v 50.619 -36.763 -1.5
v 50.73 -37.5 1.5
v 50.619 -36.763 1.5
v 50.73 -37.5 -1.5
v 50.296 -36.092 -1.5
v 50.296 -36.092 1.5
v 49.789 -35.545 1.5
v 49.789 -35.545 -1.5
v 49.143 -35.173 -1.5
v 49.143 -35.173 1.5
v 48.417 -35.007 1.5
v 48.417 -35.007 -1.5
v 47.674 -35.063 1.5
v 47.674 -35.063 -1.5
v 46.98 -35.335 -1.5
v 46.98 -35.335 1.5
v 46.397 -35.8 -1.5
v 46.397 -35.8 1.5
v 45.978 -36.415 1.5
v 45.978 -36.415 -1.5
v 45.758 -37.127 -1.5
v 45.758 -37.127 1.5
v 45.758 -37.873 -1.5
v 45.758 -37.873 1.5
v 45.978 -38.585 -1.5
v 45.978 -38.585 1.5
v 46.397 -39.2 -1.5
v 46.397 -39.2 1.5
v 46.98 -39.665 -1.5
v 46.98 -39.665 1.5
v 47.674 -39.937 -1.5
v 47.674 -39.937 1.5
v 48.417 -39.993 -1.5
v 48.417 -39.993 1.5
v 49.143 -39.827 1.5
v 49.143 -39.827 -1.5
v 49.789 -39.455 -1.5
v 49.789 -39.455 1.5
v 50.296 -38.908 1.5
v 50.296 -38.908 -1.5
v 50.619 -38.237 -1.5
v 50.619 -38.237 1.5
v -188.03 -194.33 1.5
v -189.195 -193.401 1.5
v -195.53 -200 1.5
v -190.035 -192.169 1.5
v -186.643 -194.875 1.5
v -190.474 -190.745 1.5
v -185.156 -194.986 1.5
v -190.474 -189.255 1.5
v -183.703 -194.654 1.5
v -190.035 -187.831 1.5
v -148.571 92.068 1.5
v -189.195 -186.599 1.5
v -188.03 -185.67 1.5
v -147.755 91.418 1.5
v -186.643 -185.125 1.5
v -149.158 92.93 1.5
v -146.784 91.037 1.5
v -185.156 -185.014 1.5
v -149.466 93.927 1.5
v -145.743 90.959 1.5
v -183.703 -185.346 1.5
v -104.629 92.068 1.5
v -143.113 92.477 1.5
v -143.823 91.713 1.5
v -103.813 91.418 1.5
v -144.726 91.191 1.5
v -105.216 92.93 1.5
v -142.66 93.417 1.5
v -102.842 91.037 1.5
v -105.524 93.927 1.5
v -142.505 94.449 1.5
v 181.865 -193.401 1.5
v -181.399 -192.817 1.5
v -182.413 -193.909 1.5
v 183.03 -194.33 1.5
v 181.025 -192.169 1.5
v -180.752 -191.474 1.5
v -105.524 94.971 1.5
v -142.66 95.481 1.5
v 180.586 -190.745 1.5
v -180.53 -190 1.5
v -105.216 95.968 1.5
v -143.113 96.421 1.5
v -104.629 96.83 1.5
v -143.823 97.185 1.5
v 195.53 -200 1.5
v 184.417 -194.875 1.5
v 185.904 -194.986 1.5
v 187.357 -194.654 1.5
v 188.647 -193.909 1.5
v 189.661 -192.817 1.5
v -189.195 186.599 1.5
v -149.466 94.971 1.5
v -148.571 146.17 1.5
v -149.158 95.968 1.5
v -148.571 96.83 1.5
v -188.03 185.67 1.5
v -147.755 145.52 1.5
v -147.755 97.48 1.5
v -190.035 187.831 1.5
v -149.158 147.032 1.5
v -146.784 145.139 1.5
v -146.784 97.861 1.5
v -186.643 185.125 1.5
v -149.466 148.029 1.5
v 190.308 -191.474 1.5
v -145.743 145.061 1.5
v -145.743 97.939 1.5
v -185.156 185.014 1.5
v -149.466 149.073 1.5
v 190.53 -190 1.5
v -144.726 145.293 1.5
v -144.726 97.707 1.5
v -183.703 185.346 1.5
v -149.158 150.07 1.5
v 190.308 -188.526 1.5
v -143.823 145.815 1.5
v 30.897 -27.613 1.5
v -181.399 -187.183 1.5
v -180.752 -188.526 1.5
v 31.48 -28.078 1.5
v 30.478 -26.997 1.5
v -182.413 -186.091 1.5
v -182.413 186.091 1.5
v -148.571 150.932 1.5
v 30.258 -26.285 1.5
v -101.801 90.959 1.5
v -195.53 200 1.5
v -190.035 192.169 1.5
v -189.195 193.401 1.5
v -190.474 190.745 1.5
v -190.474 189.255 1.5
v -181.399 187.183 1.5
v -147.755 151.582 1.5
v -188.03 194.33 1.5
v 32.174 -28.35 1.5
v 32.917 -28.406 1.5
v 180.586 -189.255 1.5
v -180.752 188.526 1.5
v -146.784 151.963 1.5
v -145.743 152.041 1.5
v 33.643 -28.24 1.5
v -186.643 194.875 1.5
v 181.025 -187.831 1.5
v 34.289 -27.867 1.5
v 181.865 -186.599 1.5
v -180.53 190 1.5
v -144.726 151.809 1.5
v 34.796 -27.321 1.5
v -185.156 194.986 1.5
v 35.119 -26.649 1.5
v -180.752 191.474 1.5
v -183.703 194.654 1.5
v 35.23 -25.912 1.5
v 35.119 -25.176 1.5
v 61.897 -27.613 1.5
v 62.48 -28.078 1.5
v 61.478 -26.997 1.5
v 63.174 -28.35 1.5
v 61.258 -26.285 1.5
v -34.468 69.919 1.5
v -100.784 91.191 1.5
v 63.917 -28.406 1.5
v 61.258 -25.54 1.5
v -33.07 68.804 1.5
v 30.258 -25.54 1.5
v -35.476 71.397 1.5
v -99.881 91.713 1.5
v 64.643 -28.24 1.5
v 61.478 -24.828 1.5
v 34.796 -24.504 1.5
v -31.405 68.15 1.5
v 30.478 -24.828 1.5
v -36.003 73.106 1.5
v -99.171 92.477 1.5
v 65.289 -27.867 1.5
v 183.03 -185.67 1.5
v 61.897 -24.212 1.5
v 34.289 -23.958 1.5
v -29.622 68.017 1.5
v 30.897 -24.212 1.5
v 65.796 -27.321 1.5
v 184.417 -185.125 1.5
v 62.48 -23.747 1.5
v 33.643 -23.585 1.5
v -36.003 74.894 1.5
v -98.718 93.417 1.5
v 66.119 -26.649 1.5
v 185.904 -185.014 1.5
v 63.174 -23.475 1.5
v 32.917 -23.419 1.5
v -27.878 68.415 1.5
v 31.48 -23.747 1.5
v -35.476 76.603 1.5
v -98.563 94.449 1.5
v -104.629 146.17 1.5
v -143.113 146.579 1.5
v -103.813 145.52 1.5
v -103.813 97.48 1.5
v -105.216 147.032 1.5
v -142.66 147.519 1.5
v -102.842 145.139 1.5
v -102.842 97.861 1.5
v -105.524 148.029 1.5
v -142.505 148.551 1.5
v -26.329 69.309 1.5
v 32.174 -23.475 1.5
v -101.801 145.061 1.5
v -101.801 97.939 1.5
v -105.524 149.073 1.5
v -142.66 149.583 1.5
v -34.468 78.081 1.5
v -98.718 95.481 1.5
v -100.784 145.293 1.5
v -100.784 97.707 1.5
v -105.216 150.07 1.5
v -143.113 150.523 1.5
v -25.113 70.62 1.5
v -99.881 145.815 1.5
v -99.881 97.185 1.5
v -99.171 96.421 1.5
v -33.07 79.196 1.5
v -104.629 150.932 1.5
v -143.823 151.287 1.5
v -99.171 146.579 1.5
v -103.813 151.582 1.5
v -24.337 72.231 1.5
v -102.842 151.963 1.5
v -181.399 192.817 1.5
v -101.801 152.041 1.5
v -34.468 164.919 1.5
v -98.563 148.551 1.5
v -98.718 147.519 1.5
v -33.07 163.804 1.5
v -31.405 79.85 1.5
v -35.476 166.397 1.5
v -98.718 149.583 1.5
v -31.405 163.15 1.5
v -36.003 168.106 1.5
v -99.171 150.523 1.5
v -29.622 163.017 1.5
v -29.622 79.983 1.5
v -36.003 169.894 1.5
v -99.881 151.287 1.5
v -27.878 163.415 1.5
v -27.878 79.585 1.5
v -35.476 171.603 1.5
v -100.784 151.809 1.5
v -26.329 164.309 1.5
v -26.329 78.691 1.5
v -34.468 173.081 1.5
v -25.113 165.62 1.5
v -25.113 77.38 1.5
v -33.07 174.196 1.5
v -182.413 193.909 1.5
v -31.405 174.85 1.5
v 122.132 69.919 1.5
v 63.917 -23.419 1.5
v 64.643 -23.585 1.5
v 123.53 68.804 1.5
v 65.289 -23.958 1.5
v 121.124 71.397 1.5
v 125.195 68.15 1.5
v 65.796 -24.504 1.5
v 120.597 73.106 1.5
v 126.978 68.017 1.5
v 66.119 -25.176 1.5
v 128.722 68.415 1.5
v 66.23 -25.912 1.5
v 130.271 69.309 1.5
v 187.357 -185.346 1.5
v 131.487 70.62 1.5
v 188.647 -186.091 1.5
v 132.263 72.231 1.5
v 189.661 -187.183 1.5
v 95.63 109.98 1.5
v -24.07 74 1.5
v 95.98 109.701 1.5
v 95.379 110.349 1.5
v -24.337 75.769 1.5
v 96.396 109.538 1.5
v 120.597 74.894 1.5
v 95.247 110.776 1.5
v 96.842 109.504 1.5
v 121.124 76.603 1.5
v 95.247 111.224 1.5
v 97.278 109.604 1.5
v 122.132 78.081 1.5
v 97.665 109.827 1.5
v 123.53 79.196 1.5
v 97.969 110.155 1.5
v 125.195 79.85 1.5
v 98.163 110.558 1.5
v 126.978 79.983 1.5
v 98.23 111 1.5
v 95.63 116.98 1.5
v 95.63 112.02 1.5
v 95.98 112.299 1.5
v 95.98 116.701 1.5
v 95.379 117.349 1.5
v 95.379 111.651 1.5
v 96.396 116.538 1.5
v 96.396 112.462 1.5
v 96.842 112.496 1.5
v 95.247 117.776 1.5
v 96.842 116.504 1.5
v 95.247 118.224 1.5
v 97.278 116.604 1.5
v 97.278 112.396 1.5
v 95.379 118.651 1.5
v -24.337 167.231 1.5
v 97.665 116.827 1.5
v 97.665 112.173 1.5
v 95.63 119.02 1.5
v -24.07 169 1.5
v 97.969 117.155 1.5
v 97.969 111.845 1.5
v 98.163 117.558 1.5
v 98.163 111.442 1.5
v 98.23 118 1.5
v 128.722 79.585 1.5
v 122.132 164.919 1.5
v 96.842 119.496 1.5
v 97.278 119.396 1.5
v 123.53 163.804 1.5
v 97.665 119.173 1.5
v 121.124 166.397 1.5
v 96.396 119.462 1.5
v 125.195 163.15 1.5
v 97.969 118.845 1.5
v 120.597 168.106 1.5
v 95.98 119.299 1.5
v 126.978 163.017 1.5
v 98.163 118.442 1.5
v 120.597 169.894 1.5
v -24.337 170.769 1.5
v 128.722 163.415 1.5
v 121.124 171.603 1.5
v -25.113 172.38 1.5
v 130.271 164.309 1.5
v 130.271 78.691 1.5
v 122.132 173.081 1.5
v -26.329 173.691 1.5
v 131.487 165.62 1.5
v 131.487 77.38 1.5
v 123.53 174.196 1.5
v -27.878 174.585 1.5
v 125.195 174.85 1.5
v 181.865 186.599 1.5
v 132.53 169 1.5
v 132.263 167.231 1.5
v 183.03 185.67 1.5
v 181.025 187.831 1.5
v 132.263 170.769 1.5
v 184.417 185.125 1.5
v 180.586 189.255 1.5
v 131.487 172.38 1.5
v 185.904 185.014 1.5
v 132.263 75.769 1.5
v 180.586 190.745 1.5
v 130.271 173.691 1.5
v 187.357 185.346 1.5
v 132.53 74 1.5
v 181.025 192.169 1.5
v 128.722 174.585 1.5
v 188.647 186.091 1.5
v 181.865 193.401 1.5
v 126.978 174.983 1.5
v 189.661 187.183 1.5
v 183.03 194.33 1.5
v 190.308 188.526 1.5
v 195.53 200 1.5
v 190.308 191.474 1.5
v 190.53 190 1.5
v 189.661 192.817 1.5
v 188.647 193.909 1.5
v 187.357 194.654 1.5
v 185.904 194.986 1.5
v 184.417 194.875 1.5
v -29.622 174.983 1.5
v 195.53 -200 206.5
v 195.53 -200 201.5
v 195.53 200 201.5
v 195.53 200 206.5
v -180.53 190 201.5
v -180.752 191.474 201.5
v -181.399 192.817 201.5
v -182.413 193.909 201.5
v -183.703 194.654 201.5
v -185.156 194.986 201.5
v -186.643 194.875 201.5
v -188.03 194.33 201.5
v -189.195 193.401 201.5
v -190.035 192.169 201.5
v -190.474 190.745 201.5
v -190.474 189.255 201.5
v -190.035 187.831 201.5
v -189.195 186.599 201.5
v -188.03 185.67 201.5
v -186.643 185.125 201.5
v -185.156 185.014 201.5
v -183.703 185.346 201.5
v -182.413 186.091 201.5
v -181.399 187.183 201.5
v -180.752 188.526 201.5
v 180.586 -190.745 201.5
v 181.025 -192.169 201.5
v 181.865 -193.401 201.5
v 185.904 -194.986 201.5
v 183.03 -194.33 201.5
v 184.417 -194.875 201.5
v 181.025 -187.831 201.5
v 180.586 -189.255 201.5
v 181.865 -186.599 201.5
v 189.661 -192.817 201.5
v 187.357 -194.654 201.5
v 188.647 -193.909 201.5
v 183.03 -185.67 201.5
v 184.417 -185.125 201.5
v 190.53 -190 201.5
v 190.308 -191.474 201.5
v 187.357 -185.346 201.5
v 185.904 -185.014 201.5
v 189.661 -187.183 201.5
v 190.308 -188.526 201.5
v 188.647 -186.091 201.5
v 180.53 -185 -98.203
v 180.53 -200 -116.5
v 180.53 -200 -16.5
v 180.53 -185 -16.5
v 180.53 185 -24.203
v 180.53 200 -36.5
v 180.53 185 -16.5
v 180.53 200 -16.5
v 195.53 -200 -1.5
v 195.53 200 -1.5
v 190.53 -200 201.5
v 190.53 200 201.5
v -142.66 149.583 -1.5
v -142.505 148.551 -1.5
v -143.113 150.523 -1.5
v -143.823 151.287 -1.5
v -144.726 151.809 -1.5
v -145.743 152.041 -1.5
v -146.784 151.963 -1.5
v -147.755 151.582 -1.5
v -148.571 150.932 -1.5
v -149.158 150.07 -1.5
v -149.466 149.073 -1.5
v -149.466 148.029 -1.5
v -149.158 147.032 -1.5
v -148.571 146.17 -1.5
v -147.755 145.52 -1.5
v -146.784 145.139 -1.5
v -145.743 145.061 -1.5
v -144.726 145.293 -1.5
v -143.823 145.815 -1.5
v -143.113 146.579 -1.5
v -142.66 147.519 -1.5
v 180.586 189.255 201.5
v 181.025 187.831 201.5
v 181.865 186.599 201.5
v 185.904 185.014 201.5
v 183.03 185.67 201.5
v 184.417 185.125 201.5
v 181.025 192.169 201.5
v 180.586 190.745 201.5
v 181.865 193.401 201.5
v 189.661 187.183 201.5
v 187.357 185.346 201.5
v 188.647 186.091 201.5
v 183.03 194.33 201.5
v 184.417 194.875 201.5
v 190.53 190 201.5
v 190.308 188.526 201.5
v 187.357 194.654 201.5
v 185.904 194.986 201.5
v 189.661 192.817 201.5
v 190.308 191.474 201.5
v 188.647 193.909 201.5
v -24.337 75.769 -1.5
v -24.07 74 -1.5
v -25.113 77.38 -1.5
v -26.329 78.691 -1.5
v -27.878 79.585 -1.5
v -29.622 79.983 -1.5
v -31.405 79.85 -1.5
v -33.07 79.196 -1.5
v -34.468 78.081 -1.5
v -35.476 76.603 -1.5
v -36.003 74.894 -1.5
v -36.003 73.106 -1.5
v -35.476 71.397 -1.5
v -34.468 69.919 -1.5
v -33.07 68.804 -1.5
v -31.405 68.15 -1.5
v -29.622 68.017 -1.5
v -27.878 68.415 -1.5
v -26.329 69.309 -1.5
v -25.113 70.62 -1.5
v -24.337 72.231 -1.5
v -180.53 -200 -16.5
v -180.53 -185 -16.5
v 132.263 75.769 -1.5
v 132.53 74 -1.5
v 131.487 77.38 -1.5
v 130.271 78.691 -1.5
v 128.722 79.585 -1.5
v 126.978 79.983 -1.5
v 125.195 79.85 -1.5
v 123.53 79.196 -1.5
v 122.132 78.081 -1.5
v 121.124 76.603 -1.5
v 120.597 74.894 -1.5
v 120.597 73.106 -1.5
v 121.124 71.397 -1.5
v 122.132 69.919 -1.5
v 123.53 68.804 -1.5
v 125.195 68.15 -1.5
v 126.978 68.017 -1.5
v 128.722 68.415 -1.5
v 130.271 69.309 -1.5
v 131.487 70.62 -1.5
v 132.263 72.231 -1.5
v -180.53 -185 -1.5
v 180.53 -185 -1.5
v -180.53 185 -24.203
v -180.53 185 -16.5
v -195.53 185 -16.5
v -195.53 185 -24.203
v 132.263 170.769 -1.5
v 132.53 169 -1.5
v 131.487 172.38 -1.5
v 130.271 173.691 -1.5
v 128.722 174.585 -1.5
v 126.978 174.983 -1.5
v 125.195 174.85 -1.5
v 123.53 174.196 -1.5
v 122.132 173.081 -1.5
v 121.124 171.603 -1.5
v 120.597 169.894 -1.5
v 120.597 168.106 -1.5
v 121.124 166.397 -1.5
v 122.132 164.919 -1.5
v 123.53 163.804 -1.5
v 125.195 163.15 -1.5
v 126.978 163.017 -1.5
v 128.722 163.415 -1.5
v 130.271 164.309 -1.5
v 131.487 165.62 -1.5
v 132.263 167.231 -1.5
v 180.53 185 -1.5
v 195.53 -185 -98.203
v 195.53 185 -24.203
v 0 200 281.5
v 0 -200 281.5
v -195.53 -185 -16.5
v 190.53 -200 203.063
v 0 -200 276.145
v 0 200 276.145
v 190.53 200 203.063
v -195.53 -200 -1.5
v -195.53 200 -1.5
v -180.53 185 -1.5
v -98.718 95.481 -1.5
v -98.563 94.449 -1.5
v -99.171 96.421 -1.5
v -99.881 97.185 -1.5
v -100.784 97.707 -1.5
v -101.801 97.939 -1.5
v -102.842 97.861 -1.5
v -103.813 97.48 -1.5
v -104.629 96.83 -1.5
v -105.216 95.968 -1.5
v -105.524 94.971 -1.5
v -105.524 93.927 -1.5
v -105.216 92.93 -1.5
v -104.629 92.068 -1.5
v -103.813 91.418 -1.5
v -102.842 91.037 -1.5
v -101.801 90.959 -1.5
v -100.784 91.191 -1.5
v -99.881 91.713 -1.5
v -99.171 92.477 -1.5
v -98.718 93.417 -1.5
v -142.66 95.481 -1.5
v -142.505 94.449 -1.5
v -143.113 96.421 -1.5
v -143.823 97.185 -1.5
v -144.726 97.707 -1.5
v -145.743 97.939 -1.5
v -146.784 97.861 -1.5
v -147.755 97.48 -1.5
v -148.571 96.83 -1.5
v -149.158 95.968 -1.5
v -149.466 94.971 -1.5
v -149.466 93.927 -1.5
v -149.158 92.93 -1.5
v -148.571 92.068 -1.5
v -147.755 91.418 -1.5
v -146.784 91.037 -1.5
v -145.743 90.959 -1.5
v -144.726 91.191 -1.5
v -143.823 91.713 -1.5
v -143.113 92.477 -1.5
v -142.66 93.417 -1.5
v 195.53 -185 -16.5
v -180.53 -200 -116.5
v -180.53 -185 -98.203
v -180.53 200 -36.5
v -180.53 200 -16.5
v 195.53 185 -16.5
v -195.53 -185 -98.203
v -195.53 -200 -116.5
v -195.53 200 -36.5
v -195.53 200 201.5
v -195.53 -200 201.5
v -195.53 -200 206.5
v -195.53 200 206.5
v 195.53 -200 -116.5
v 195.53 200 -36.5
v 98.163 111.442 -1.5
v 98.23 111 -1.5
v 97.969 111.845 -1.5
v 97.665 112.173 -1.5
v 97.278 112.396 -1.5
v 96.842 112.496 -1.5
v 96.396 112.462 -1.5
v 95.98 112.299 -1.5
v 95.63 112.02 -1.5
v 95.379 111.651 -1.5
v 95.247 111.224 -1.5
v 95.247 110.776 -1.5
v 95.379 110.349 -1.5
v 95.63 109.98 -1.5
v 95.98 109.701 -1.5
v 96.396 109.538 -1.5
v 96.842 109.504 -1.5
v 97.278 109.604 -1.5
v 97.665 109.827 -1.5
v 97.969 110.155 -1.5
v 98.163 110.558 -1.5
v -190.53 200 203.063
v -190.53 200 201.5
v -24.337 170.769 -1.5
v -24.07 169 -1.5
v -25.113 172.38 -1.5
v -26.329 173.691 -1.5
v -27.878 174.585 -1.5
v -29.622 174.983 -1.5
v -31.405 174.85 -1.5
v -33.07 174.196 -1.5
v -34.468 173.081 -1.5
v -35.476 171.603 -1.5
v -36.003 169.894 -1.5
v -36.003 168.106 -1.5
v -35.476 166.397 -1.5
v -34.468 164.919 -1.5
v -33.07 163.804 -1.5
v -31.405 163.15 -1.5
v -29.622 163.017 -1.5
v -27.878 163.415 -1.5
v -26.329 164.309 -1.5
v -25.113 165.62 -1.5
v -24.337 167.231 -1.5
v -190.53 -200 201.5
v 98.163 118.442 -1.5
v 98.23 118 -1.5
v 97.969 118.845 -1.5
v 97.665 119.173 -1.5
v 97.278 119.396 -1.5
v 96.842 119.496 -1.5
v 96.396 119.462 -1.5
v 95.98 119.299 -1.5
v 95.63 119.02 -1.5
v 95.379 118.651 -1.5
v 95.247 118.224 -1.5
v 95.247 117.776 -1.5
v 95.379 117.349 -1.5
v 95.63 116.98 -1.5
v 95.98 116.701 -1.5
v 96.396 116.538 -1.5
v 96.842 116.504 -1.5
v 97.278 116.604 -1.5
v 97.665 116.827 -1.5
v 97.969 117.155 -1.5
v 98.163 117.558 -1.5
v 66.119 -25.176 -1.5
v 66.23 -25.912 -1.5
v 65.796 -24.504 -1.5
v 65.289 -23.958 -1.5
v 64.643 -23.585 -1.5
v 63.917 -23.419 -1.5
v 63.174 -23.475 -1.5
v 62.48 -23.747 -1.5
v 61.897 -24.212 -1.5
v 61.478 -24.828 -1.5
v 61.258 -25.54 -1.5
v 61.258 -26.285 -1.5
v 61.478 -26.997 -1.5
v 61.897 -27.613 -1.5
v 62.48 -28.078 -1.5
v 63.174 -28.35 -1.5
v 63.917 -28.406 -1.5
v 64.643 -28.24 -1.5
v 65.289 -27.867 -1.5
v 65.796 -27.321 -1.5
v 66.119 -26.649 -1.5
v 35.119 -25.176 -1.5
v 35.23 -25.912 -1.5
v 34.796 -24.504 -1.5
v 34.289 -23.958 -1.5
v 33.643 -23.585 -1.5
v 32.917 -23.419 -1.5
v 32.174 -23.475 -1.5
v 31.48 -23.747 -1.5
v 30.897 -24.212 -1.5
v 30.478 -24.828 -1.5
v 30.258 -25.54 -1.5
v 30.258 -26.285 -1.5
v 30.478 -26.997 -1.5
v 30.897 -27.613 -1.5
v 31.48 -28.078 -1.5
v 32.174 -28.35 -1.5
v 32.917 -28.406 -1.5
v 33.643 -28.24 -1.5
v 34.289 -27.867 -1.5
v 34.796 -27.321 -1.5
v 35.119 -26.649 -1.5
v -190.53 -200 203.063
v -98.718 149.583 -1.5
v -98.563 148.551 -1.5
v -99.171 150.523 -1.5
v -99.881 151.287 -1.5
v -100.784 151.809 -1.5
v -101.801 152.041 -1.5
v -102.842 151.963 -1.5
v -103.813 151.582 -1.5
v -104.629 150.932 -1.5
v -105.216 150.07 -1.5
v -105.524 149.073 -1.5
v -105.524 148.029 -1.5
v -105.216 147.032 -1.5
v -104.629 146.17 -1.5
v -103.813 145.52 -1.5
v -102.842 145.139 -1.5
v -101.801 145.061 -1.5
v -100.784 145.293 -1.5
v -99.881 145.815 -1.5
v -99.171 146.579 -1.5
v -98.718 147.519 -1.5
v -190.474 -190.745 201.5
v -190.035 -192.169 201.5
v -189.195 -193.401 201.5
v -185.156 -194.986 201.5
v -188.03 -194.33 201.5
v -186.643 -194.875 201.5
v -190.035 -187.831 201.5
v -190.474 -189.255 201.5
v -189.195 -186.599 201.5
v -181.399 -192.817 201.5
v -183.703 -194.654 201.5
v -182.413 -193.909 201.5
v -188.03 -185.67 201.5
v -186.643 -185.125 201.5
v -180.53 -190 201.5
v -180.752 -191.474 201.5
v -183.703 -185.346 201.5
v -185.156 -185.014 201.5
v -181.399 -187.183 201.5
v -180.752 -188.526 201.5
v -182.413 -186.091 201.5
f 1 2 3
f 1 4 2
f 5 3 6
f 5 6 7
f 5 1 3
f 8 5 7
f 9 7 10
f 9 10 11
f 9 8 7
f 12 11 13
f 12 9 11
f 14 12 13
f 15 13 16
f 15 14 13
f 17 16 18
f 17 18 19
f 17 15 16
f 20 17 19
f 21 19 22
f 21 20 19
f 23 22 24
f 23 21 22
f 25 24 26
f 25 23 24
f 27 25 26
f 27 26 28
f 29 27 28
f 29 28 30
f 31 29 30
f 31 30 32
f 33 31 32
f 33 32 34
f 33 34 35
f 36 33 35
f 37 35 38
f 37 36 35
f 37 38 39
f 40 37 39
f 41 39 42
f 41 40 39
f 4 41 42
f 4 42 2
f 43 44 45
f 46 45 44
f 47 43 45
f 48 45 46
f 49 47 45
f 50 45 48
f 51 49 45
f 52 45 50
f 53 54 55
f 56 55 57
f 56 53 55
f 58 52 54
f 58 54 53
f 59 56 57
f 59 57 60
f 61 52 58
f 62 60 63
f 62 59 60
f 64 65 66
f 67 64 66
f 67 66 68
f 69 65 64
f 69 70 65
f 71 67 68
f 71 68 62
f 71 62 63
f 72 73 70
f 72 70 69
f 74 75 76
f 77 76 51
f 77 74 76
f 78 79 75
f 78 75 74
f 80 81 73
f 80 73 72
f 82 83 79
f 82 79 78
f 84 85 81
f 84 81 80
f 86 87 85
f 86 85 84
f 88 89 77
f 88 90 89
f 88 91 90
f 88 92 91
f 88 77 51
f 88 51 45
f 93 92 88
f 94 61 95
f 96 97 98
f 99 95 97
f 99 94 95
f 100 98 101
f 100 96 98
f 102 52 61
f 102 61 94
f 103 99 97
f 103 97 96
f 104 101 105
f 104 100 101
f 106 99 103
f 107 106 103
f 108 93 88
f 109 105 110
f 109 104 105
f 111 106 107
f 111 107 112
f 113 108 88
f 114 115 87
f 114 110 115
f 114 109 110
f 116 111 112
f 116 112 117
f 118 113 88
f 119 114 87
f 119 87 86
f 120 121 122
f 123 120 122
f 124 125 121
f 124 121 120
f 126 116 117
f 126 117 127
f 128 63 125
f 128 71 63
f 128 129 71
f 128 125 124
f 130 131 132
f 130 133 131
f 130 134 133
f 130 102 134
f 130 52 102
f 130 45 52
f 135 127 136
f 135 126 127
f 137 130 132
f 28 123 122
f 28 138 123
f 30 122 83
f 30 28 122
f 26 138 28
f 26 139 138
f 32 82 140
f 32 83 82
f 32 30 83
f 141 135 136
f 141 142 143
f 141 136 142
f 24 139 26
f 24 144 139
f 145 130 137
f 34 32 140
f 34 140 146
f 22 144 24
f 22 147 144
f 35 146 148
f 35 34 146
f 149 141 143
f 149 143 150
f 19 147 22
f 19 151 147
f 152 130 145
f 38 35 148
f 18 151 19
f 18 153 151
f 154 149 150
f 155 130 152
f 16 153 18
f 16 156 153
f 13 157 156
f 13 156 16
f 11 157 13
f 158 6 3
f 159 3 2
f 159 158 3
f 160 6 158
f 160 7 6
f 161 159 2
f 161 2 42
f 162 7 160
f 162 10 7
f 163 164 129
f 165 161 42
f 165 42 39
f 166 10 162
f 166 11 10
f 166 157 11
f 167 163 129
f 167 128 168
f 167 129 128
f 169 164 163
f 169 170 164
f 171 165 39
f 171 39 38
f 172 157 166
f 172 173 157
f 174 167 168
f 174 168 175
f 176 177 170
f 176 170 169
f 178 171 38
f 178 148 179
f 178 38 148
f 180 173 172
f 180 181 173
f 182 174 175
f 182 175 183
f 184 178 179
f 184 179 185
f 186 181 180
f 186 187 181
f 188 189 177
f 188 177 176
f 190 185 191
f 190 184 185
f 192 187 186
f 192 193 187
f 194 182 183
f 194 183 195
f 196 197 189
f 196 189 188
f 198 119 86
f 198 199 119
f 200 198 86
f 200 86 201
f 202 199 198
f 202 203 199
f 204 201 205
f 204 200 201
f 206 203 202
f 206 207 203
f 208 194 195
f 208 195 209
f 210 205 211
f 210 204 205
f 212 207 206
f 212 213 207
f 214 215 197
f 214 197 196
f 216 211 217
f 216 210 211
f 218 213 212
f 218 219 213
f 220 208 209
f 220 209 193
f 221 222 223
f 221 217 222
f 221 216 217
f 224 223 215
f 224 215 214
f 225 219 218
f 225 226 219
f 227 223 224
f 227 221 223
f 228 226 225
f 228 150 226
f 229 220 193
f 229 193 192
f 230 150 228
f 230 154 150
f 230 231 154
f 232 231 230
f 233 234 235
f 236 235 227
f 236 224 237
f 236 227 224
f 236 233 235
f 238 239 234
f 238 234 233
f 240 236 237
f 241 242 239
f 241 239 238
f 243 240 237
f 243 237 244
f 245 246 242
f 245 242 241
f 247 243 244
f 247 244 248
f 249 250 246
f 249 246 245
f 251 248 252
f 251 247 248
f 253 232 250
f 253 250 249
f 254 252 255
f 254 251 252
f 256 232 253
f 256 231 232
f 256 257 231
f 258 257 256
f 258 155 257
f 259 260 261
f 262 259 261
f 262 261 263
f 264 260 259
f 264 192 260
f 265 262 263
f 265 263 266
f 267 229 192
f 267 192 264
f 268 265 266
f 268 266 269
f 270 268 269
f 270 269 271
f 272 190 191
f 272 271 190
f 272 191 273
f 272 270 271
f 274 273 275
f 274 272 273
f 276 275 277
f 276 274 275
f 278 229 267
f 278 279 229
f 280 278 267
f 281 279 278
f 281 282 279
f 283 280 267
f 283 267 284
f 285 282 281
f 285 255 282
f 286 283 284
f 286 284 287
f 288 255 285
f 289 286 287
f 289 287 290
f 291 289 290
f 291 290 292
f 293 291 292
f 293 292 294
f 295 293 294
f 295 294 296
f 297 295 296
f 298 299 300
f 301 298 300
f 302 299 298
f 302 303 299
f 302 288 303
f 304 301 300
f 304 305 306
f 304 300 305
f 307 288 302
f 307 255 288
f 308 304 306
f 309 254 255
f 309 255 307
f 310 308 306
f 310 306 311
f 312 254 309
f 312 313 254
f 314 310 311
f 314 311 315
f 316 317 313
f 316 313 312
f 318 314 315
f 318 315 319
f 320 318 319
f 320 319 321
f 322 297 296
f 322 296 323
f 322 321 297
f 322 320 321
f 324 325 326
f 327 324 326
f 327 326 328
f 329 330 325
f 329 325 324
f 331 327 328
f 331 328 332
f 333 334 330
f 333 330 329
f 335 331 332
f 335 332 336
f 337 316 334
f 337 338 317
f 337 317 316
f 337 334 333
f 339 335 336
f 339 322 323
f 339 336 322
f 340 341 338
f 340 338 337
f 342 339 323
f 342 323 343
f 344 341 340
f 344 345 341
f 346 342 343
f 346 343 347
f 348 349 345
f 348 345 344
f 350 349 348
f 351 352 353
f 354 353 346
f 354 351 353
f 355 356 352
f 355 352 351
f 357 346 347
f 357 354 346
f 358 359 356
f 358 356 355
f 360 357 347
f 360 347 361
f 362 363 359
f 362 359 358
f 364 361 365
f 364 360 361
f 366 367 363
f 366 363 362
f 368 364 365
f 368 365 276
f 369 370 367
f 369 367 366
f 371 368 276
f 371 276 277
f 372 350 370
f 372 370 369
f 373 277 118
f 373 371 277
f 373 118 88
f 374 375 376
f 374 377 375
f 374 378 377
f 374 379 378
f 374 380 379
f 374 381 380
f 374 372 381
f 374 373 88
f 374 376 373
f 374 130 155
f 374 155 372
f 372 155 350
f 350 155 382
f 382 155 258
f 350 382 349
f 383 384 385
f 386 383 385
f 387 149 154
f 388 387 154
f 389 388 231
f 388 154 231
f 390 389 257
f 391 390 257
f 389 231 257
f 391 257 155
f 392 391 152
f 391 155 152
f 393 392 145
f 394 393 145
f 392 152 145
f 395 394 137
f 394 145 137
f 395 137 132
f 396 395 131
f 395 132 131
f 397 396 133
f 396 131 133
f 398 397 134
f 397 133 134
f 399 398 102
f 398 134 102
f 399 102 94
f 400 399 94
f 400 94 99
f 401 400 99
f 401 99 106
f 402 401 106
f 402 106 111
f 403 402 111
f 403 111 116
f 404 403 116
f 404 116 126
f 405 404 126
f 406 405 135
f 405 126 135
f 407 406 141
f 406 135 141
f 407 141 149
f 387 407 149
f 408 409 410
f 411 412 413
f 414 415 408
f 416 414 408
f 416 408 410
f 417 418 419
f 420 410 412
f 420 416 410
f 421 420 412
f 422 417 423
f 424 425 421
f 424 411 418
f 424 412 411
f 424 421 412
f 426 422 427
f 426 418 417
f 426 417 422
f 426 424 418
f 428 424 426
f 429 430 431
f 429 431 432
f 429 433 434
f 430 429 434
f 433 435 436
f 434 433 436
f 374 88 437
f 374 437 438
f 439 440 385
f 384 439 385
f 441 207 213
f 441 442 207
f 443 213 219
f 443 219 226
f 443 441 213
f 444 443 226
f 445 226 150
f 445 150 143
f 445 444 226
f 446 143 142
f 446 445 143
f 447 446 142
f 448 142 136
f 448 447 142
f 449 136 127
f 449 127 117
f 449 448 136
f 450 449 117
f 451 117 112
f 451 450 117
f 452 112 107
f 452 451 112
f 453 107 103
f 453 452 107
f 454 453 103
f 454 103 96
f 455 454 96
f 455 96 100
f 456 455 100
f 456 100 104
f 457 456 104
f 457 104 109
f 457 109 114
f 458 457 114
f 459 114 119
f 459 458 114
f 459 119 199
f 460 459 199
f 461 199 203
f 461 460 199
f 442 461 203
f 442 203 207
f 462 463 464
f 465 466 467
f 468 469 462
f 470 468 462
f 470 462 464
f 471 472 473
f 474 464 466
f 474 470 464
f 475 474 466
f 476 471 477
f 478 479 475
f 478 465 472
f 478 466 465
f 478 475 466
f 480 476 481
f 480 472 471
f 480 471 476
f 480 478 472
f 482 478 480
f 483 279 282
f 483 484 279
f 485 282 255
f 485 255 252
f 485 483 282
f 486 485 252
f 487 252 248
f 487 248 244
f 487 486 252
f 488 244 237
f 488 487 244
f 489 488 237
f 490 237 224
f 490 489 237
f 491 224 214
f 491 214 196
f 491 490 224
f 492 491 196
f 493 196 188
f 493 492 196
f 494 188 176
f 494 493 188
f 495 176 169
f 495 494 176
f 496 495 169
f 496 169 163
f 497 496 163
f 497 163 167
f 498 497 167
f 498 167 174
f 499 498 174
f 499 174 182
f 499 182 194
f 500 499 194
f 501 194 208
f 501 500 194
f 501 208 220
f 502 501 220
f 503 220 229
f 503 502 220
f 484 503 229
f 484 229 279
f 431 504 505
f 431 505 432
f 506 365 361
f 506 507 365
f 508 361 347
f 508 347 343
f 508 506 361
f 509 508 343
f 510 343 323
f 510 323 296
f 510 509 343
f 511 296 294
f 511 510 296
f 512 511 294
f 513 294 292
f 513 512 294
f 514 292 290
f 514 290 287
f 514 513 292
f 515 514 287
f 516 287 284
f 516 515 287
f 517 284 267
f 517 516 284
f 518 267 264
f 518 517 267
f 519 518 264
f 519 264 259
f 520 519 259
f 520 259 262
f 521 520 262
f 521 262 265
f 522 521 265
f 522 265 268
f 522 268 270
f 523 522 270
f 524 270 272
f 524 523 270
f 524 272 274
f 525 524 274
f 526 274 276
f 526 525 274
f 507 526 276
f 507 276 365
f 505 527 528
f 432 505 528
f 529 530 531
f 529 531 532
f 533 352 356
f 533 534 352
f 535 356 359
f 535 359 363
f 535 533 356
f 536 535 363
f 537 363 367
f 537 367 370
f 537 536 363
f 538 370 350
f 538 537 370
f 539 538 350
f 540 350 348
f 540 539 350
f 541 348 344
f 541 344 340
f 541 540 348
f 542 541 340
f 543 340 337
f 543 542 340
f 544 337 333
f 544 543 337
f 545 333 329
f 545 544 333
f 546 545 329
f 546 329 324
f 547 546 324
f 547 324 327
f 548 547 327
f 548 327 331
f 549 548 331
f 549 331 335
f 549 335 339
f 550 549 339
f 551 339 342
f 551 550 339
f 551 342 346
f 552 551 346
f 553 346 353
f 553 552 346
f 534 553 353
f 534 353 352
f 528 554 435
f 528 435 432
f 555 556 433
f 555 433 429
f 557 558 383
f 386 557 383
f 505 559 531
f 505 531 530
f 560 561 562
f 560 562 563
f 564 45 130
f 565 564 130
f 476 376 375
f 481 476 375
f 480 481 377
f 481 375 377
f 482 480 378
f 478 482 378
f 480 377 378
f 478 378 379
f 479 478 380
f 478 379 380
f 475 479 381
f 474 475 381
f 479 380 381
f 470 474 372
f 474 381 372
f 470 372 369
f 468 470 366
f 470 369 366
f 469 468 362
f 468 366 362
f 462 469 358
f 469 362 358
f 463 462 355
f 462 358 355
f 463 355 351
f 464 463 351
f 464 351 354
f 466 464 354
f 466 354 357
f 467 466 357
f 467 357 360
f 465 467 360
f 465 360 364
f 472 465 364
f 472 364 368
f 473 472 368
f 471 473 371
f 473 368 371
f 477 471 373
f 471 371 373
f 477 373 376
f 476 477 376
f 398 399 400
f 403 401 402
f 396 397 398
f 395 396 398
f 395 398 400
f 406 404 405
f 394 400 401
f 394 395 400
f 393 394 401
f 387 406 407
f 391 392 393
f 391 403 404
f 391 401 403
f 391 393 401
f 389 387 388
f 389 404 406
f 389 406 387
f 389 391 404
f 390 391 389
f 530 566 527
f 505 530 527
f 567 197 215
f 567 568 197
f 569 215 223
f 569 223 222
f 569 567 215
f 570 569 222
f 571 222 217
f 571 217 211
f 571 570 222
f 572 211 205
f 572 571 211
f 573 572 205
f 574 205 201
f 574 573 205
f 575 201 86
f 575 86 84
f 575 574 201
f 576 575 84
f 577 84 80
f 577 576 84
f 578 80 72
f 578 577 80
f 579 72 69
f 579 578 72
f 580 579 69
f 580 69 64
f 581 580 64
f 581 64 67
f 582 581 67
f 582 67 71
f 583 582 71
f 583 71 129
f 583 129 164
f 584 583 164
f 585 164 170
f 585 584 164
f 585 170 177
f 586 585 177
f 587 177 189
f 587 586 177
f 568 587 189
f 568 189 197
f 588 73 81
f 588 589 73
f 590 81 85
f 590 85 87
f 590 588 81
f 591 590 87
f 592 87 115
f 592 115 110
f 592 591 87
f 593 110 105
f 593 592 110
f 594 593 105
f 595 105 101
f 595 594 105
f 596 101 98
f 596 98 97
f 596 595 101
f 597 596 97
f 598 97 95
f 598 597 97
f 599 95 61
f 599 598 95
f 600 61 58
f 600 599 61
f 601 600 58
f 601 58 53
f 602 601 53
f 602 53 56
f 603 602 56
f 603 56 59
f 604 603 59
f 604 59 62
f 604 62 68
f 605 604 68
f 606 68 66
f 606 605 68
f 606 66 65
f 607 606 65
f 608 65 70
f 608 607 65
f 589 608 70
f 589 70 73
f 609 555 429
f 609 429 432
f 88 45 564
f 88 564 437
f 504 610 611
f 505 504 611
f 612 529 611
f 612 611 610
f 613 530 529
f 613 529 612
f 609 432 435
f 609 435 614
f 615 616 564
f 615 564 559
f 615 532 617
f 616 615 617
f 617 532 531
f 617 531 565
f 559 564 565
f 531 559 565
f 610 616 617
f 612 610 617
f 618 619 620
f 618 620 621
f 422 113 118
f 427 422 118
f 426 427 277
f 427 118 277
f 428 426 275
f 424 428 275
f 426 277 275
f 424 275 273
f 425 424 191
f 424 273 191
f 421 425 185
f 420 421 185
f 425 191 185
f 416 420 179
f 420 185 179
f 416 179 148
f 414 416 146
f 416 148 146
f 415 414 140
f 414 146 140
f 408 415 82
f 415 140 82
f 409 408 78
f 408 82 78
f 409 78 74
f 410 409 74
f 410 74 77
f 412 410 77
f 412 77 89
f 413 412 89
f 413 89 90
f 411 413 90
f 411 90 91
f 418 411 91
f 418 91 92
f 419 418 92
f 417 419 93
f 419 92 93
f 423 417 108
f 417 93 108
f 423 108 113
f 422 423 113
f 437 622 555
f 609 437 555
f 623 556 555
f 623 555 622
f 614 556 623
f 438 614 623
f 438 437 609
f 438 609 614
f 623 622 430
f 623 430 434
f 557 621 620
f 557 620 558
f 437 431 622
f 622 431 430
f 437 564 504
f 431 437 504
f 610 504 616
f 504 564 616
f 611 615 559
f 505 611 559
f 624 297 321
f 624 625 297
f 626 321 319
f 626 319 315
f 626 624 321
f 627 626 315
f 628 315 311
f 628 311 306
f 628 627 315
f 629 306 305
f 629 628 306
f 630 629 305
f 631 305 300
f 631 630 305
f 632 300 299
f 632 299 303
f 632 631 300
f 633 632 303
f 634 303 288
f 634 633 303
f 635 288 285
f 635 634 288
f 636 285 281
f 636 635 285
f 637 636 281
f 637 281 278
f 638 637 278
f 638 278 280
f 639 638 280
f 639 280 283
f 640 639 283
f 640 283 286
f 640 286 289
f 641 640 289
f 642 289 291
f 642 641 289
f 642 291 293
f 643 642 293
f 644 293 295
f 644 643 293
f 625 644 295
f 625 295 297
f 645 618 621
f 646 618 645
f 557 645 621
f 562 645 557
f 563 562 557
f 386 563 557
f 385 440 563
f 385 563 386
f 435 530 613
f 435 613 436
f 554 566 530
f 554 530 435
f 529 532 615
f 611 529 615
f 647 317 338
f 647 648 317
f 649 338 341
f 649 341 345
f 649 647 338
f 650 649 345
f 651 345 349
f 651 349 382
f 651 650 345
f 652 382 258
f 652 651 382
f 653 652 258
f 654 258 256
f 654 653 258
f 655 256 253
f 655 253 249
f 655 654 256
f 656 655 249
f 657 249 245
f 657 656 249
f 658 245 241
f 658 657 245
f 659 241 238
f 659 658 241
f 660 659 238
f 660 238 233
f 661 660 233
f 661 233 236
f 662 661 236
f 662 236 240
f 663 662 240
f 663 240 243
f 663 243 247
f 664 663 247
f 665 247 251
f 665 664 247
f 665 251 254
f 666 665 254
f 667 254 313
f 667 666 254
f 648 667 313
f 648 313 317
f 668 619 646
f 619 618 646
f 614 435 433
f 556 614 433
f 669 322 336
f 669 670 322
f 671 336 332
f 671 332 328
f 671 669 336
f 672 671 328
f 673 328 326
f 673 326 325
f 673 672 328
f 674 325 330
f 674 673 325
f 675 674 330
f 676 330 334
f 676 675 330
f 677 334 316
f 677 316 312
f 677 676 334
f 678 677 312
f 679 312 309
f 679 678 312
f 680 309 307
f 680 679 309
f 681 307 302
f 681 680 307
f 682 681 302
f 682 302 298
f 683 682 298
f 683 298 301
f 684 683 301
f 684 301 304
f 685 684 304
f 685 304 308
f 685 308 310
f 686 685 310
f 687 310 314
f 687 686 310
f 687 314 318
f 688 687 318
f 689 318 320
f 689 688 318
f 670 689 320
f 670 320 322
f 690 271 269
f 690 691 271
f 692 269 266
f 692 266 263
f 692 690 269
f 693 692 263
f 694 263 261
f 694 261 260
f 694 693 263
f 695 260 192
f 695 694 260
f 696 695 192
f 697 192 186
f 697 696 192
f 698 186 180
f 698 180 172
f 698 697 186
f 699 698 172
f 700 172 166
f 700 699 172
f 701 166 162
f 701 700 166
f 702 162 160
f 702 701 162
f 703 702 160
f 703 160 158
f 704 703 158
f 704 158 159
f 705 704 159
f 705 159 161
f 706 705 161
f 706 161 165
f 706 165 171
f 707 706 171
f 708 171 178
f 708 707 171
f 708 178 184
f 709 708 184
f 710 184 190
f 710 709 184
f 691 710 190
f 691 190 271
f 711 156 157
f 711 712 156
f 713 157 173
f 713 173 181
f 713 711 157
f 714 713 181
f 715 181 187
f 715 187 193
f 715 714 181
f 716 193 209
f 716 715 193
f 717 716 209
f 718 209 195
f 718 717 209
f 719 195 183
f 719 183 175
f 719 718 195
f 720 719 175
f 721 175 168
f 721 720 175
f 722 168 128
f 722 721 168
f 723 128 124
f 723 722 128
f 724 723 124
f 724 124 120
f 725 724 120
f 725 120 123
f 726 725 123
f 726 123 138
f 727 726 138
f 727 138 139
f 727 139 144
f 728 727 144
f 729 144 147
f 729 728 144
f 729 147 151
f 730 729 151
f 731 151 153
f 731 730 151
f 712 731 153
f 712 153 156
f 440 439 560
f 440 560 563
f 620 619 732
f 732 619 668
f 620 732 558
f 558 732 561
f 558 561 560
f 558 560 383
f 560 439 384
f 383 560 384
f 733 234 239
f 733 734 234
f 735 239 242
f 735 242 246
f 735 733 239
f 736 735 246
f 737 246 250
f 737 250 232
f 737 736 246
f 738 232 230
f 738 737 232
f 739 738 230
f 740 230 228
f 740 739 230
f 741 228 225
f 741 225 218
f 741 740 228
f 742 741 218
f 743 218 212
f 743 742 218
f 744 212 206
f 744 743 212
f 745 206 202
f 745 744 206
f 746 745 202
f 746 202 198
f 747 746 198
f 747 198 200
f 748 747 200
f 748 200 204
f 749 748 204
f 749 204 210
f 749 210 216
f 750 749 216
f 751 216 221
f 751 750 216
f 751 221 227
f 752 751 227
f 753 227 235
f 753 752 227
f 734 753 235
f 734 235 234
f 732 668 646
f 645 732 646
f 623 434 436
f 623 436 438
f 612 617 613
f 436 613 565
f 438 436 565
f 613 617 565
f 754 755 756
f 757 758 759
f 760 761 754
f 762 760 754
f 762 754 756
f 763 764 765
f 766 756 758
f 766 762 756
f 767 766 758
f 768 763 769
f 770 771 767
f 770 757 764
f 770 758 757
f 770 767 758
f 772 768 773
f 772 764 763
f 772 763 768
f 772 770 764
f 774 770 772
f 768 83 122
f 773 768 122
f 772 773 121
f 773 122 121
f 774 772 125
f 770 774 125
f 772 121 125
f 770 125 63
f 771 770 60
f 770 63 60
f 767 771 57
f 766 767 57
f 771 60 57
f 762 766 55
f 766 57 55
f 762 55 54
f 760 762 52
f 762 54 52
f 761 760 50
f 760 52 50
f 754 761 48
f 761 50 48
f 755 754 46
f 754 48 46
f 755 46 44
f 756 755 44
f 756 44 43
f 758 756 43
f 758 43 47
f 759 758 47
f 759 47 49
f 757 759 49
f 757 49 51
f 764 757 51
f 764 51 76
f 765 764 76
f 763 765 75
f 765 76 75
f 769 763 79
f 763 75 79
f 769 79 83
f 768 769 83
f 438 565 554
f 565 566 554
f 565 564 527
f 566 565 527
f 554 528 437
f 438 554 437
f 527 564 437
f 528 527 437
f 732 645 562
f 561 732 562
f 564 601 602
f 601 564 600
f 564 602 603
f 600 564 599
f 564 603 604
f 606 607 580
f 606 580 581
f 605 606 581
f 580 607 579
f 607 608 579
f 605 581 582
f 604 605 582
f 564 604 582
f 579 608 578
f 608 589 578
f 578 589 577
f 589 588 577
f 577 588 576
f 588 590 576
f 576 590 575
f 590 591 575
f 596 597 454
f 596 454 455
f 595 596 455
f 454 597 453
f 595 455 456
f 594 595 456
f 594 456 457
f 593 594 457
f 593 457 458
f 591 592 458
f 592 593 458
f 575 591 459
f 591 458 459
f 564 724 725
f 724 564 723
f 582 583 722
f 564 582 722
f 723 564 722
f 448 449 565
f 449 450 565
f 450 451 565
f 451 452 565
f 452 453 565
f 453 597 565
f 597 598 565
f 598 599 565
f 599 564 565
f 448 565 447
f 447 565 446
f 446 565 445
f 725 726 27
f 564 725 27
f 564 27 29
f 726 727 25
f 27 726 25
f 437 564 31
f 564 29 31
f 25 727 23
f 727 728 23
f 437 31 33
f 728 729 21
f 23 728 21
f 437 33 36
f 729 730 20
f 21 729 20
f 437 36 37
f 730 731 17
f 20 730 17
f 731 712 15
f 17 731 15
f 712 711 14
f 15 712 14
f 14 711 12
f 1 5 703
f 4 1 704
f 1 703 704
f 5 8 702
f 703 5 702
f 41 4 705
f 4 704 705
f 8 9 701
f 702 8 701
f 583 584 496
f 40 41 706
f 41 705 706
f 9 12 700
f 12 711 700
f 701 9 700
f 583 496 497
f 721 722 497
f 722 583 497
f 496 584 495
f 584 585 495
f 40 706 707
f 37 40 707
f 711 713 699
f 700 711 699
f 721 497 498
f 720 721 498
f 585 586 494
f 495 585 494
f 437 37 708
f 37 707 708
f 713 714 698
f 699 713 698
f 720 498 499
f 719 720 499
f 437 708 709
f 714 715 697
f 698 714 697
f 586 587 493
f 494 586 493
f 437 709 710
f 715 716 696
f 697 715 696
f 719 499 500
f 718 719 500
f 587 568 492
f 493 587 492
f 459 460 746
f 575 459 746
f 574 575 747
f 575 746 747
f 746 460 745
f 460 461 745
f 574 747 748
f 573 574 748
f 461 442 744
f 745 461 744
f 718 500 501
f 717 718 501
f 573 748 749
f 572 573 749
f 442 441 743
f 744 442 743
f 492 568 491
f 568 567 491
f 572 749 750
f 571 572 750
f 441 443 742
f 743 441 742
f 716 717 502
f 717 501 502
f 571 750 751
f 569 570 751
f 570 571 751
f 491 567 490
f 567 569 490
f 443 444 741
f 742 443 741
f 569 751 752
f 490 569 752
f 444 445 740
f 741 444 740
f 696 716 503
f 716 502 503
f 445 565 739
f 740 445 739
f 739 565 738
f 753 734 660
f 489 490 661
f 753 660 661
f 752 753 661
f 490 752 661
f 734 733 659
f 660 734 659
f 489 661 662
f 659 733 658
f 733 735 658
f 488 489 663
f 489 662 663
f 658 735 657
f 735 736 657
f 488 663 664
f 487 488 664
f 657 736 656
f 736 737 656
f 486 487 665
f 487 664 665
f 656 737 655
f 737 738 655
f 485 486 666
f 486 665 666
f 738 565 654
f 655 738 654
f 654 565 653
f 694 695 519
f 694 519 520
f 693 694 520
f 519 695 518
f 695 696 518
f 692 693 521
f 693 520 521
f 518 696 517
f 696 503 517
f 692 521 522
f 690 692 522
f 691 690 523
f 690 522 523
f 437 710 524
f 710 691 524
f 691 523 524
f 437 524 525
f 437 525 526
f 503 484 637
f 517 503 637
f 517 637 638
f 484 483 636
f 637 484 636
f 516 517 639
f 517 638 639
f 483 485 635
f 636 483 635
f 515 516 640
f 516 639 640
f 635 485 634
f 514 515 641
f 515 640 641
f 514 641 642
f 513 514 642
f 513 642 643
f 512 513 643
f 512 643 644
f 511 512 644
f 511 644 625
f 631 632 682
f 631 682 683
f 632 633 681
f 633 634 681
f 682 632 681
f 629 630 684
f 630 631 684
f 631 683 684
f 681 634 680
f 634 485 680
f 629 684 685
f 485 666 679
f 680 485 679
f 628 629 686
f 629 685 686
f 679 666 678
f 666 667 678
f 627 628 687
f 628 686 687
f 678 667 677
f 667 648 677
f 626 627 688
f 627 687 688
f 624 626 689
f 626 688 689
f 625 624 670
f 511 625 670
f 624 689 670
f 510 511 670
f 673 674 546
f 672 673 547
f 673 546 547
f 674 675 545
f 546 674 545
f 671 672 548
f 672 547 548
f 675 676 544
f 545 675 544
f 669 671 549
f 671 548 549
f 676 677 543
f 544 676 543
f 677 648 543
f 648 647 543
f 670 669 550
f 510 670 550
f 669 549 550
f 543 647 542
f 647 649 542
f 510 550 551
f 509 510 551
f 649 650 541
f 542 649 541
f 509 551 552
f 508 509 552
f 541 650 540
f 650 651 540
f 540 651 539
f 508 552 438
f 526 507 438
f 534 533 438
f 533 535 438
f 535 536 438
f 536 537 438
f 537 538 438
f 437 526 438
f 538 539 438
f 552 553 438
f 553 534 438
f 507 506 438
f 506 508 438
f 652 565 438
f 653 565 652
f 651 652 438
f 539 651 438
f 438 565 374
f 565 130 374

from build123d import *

# Parameters (mm, degrees)
F0_W      = 391.06
F0_H      = 400
F0_R      = 2.5
F0_R_2    = 3.5
F0_R_3    = 6
F0_R_4    = 1.5
F1_DEPTH  = 1.5
F2_W      = 391.06
F2_H      = 400
F2_W_2    = 361.06
F2_H_2    = 370
F3_DEPTH  = 15
F5_DEPTH  = 15
F7_R      = 5
F8_DEPTH  = 200
F9_W      = 391.06
F9_H      = 400
F10_DEPTH = 80
F12_DEPTH = 400
F13_T     = -5


with BuildPart() as f1:
    # F0 (on Top) → F1 (new body, symmetric)
    with BuildSketch(Plane.XY):
        Rectangle(F0_W, F0_H)
        with Locations((32.73, -25.9125)):
            Circle(F0_R, mode=Mode.SUBTRACT)
        with Locations((48.23, -37.5)):
            Circle(F0_R, mode=Mode.SUBTRACT)
        with Locations((63.73, -25.9125)):
            Circle(F0_R, mode=Mode.SUBTRACT)
        with Locations((-146.005, 94.449)):
            Circle(F0_R_2, mode=Mode.SUBTRACT)
        with Locations((-102.063, 94.449)):
            Circle(F0_R_2, mode=Mode.SUBTRACT)
        with Locations((-30.07, 74)):
            Circle(F0_R_3, mode=Mode.SUBTRACT)
        with Locations((-146.005, 148.551)):
            Circle(F0_R_2, mode=Mode.SUBTRACT)
        with Locations((-102.063, 148.551)):
            Circle(F0_R_2, mode=Mode.SUBTRACT)
        with Locations((-30.07, 169)):
            Circle(F0_R_3, mode=Mode.SUBTRACT)
        with Locations((126.53, 74)):
            Circle(F0_R_3, mode=Mode.SUBTRACT)
        with Locations((96.73, 111)):
            Circle(F0_R_4, mode=Mode.SUBTRACT)
        with Locations((96.73, 118)):
            Circle(F0_R_4, mode=Mode.SUBTRACT)
        with Locations((126.53, 169)):
            Circle(F0_R_3, mode=Mode.SUBTRACT)
    extrude(amount=F1_DEPTH, both=True)

    # F7 (on face) → F8 (join)
    with BuildSketch(Plane.XY.offset(1.5)):
        with Locations((-185.53, 190)):
            Circle(F7_R)
        with Locations((185.53, 190)):
            Circle(F7_R)
        with Locations((185.53, -190)):
            Circle(F7_R)
        with Locations((-185.53, -190)):
            Circle(F7_R)
    extrude(amount=F8_DEPTH)


with BuildPart() as f3:
    # F2 (on face) → F3 (new body)
    with BuildSketch(Plane(origin=(0, 0, -1.5), x_dir=(1, 0, 0), z_dir=(0, 0, -1))):
        Rectangle(F2_W, F2_H)
        Rectangle(F2_W_2, F2_H_2, mode=Mode.SUBTRACT)
    extrude(amount=F3_DEPTH)

    # F4 (on face) → F5 (join)
    with BuildSketch(Plane.YZ.offset(195.53)):
        Polygon((-185, -16.5), (-200, -16.5), (-200, -116.5), (200, -36.5), (200, -16.5), (185, -16.5), (185, -24.2029414592), (-185, -98.2029414592), align=None)
    extrude(amount=-F5_DEPTH)

    # F6: F3 across plane


with BuildPart() as f3_1:
    add(f3.part)
    add(f3.part.mirror(Plane.YZ))


with BuildPart() as f10:
    # F9 (on face) → F10 (new body)
    with BuildSketch(Plane.XY.offset(201.5)):
        Rectangle(F9_W, F9_H)
    extrude(amount=F10_DEPTH)

    # F11 (on face) → F12 (cut, through all)
    with BuildSketch(Plane.XZ.offset(200)):
        Polygon((-195.53, 281.5), (-195.53, 206.5), (0, 281.5), align=None)
        Polygon((195.53, 281.5), (0, 281.5), (195.53, 206.5), align=None)
    extrude(amount=-F12_DEPTH, mode=Mode.SUBTRACT)

    # F13
    f13_openings = [f10.faces().sort_by_distance(p)[0] for p in [
        (0, 0, 201.5),
        (0, 200, 228.264706),
        (0, -200, 228.264706),
    ]]
    offset(amount=F13_T, openings=f13_openings)


solid = Compound([f1.part, f3_1.part, f10.part])
